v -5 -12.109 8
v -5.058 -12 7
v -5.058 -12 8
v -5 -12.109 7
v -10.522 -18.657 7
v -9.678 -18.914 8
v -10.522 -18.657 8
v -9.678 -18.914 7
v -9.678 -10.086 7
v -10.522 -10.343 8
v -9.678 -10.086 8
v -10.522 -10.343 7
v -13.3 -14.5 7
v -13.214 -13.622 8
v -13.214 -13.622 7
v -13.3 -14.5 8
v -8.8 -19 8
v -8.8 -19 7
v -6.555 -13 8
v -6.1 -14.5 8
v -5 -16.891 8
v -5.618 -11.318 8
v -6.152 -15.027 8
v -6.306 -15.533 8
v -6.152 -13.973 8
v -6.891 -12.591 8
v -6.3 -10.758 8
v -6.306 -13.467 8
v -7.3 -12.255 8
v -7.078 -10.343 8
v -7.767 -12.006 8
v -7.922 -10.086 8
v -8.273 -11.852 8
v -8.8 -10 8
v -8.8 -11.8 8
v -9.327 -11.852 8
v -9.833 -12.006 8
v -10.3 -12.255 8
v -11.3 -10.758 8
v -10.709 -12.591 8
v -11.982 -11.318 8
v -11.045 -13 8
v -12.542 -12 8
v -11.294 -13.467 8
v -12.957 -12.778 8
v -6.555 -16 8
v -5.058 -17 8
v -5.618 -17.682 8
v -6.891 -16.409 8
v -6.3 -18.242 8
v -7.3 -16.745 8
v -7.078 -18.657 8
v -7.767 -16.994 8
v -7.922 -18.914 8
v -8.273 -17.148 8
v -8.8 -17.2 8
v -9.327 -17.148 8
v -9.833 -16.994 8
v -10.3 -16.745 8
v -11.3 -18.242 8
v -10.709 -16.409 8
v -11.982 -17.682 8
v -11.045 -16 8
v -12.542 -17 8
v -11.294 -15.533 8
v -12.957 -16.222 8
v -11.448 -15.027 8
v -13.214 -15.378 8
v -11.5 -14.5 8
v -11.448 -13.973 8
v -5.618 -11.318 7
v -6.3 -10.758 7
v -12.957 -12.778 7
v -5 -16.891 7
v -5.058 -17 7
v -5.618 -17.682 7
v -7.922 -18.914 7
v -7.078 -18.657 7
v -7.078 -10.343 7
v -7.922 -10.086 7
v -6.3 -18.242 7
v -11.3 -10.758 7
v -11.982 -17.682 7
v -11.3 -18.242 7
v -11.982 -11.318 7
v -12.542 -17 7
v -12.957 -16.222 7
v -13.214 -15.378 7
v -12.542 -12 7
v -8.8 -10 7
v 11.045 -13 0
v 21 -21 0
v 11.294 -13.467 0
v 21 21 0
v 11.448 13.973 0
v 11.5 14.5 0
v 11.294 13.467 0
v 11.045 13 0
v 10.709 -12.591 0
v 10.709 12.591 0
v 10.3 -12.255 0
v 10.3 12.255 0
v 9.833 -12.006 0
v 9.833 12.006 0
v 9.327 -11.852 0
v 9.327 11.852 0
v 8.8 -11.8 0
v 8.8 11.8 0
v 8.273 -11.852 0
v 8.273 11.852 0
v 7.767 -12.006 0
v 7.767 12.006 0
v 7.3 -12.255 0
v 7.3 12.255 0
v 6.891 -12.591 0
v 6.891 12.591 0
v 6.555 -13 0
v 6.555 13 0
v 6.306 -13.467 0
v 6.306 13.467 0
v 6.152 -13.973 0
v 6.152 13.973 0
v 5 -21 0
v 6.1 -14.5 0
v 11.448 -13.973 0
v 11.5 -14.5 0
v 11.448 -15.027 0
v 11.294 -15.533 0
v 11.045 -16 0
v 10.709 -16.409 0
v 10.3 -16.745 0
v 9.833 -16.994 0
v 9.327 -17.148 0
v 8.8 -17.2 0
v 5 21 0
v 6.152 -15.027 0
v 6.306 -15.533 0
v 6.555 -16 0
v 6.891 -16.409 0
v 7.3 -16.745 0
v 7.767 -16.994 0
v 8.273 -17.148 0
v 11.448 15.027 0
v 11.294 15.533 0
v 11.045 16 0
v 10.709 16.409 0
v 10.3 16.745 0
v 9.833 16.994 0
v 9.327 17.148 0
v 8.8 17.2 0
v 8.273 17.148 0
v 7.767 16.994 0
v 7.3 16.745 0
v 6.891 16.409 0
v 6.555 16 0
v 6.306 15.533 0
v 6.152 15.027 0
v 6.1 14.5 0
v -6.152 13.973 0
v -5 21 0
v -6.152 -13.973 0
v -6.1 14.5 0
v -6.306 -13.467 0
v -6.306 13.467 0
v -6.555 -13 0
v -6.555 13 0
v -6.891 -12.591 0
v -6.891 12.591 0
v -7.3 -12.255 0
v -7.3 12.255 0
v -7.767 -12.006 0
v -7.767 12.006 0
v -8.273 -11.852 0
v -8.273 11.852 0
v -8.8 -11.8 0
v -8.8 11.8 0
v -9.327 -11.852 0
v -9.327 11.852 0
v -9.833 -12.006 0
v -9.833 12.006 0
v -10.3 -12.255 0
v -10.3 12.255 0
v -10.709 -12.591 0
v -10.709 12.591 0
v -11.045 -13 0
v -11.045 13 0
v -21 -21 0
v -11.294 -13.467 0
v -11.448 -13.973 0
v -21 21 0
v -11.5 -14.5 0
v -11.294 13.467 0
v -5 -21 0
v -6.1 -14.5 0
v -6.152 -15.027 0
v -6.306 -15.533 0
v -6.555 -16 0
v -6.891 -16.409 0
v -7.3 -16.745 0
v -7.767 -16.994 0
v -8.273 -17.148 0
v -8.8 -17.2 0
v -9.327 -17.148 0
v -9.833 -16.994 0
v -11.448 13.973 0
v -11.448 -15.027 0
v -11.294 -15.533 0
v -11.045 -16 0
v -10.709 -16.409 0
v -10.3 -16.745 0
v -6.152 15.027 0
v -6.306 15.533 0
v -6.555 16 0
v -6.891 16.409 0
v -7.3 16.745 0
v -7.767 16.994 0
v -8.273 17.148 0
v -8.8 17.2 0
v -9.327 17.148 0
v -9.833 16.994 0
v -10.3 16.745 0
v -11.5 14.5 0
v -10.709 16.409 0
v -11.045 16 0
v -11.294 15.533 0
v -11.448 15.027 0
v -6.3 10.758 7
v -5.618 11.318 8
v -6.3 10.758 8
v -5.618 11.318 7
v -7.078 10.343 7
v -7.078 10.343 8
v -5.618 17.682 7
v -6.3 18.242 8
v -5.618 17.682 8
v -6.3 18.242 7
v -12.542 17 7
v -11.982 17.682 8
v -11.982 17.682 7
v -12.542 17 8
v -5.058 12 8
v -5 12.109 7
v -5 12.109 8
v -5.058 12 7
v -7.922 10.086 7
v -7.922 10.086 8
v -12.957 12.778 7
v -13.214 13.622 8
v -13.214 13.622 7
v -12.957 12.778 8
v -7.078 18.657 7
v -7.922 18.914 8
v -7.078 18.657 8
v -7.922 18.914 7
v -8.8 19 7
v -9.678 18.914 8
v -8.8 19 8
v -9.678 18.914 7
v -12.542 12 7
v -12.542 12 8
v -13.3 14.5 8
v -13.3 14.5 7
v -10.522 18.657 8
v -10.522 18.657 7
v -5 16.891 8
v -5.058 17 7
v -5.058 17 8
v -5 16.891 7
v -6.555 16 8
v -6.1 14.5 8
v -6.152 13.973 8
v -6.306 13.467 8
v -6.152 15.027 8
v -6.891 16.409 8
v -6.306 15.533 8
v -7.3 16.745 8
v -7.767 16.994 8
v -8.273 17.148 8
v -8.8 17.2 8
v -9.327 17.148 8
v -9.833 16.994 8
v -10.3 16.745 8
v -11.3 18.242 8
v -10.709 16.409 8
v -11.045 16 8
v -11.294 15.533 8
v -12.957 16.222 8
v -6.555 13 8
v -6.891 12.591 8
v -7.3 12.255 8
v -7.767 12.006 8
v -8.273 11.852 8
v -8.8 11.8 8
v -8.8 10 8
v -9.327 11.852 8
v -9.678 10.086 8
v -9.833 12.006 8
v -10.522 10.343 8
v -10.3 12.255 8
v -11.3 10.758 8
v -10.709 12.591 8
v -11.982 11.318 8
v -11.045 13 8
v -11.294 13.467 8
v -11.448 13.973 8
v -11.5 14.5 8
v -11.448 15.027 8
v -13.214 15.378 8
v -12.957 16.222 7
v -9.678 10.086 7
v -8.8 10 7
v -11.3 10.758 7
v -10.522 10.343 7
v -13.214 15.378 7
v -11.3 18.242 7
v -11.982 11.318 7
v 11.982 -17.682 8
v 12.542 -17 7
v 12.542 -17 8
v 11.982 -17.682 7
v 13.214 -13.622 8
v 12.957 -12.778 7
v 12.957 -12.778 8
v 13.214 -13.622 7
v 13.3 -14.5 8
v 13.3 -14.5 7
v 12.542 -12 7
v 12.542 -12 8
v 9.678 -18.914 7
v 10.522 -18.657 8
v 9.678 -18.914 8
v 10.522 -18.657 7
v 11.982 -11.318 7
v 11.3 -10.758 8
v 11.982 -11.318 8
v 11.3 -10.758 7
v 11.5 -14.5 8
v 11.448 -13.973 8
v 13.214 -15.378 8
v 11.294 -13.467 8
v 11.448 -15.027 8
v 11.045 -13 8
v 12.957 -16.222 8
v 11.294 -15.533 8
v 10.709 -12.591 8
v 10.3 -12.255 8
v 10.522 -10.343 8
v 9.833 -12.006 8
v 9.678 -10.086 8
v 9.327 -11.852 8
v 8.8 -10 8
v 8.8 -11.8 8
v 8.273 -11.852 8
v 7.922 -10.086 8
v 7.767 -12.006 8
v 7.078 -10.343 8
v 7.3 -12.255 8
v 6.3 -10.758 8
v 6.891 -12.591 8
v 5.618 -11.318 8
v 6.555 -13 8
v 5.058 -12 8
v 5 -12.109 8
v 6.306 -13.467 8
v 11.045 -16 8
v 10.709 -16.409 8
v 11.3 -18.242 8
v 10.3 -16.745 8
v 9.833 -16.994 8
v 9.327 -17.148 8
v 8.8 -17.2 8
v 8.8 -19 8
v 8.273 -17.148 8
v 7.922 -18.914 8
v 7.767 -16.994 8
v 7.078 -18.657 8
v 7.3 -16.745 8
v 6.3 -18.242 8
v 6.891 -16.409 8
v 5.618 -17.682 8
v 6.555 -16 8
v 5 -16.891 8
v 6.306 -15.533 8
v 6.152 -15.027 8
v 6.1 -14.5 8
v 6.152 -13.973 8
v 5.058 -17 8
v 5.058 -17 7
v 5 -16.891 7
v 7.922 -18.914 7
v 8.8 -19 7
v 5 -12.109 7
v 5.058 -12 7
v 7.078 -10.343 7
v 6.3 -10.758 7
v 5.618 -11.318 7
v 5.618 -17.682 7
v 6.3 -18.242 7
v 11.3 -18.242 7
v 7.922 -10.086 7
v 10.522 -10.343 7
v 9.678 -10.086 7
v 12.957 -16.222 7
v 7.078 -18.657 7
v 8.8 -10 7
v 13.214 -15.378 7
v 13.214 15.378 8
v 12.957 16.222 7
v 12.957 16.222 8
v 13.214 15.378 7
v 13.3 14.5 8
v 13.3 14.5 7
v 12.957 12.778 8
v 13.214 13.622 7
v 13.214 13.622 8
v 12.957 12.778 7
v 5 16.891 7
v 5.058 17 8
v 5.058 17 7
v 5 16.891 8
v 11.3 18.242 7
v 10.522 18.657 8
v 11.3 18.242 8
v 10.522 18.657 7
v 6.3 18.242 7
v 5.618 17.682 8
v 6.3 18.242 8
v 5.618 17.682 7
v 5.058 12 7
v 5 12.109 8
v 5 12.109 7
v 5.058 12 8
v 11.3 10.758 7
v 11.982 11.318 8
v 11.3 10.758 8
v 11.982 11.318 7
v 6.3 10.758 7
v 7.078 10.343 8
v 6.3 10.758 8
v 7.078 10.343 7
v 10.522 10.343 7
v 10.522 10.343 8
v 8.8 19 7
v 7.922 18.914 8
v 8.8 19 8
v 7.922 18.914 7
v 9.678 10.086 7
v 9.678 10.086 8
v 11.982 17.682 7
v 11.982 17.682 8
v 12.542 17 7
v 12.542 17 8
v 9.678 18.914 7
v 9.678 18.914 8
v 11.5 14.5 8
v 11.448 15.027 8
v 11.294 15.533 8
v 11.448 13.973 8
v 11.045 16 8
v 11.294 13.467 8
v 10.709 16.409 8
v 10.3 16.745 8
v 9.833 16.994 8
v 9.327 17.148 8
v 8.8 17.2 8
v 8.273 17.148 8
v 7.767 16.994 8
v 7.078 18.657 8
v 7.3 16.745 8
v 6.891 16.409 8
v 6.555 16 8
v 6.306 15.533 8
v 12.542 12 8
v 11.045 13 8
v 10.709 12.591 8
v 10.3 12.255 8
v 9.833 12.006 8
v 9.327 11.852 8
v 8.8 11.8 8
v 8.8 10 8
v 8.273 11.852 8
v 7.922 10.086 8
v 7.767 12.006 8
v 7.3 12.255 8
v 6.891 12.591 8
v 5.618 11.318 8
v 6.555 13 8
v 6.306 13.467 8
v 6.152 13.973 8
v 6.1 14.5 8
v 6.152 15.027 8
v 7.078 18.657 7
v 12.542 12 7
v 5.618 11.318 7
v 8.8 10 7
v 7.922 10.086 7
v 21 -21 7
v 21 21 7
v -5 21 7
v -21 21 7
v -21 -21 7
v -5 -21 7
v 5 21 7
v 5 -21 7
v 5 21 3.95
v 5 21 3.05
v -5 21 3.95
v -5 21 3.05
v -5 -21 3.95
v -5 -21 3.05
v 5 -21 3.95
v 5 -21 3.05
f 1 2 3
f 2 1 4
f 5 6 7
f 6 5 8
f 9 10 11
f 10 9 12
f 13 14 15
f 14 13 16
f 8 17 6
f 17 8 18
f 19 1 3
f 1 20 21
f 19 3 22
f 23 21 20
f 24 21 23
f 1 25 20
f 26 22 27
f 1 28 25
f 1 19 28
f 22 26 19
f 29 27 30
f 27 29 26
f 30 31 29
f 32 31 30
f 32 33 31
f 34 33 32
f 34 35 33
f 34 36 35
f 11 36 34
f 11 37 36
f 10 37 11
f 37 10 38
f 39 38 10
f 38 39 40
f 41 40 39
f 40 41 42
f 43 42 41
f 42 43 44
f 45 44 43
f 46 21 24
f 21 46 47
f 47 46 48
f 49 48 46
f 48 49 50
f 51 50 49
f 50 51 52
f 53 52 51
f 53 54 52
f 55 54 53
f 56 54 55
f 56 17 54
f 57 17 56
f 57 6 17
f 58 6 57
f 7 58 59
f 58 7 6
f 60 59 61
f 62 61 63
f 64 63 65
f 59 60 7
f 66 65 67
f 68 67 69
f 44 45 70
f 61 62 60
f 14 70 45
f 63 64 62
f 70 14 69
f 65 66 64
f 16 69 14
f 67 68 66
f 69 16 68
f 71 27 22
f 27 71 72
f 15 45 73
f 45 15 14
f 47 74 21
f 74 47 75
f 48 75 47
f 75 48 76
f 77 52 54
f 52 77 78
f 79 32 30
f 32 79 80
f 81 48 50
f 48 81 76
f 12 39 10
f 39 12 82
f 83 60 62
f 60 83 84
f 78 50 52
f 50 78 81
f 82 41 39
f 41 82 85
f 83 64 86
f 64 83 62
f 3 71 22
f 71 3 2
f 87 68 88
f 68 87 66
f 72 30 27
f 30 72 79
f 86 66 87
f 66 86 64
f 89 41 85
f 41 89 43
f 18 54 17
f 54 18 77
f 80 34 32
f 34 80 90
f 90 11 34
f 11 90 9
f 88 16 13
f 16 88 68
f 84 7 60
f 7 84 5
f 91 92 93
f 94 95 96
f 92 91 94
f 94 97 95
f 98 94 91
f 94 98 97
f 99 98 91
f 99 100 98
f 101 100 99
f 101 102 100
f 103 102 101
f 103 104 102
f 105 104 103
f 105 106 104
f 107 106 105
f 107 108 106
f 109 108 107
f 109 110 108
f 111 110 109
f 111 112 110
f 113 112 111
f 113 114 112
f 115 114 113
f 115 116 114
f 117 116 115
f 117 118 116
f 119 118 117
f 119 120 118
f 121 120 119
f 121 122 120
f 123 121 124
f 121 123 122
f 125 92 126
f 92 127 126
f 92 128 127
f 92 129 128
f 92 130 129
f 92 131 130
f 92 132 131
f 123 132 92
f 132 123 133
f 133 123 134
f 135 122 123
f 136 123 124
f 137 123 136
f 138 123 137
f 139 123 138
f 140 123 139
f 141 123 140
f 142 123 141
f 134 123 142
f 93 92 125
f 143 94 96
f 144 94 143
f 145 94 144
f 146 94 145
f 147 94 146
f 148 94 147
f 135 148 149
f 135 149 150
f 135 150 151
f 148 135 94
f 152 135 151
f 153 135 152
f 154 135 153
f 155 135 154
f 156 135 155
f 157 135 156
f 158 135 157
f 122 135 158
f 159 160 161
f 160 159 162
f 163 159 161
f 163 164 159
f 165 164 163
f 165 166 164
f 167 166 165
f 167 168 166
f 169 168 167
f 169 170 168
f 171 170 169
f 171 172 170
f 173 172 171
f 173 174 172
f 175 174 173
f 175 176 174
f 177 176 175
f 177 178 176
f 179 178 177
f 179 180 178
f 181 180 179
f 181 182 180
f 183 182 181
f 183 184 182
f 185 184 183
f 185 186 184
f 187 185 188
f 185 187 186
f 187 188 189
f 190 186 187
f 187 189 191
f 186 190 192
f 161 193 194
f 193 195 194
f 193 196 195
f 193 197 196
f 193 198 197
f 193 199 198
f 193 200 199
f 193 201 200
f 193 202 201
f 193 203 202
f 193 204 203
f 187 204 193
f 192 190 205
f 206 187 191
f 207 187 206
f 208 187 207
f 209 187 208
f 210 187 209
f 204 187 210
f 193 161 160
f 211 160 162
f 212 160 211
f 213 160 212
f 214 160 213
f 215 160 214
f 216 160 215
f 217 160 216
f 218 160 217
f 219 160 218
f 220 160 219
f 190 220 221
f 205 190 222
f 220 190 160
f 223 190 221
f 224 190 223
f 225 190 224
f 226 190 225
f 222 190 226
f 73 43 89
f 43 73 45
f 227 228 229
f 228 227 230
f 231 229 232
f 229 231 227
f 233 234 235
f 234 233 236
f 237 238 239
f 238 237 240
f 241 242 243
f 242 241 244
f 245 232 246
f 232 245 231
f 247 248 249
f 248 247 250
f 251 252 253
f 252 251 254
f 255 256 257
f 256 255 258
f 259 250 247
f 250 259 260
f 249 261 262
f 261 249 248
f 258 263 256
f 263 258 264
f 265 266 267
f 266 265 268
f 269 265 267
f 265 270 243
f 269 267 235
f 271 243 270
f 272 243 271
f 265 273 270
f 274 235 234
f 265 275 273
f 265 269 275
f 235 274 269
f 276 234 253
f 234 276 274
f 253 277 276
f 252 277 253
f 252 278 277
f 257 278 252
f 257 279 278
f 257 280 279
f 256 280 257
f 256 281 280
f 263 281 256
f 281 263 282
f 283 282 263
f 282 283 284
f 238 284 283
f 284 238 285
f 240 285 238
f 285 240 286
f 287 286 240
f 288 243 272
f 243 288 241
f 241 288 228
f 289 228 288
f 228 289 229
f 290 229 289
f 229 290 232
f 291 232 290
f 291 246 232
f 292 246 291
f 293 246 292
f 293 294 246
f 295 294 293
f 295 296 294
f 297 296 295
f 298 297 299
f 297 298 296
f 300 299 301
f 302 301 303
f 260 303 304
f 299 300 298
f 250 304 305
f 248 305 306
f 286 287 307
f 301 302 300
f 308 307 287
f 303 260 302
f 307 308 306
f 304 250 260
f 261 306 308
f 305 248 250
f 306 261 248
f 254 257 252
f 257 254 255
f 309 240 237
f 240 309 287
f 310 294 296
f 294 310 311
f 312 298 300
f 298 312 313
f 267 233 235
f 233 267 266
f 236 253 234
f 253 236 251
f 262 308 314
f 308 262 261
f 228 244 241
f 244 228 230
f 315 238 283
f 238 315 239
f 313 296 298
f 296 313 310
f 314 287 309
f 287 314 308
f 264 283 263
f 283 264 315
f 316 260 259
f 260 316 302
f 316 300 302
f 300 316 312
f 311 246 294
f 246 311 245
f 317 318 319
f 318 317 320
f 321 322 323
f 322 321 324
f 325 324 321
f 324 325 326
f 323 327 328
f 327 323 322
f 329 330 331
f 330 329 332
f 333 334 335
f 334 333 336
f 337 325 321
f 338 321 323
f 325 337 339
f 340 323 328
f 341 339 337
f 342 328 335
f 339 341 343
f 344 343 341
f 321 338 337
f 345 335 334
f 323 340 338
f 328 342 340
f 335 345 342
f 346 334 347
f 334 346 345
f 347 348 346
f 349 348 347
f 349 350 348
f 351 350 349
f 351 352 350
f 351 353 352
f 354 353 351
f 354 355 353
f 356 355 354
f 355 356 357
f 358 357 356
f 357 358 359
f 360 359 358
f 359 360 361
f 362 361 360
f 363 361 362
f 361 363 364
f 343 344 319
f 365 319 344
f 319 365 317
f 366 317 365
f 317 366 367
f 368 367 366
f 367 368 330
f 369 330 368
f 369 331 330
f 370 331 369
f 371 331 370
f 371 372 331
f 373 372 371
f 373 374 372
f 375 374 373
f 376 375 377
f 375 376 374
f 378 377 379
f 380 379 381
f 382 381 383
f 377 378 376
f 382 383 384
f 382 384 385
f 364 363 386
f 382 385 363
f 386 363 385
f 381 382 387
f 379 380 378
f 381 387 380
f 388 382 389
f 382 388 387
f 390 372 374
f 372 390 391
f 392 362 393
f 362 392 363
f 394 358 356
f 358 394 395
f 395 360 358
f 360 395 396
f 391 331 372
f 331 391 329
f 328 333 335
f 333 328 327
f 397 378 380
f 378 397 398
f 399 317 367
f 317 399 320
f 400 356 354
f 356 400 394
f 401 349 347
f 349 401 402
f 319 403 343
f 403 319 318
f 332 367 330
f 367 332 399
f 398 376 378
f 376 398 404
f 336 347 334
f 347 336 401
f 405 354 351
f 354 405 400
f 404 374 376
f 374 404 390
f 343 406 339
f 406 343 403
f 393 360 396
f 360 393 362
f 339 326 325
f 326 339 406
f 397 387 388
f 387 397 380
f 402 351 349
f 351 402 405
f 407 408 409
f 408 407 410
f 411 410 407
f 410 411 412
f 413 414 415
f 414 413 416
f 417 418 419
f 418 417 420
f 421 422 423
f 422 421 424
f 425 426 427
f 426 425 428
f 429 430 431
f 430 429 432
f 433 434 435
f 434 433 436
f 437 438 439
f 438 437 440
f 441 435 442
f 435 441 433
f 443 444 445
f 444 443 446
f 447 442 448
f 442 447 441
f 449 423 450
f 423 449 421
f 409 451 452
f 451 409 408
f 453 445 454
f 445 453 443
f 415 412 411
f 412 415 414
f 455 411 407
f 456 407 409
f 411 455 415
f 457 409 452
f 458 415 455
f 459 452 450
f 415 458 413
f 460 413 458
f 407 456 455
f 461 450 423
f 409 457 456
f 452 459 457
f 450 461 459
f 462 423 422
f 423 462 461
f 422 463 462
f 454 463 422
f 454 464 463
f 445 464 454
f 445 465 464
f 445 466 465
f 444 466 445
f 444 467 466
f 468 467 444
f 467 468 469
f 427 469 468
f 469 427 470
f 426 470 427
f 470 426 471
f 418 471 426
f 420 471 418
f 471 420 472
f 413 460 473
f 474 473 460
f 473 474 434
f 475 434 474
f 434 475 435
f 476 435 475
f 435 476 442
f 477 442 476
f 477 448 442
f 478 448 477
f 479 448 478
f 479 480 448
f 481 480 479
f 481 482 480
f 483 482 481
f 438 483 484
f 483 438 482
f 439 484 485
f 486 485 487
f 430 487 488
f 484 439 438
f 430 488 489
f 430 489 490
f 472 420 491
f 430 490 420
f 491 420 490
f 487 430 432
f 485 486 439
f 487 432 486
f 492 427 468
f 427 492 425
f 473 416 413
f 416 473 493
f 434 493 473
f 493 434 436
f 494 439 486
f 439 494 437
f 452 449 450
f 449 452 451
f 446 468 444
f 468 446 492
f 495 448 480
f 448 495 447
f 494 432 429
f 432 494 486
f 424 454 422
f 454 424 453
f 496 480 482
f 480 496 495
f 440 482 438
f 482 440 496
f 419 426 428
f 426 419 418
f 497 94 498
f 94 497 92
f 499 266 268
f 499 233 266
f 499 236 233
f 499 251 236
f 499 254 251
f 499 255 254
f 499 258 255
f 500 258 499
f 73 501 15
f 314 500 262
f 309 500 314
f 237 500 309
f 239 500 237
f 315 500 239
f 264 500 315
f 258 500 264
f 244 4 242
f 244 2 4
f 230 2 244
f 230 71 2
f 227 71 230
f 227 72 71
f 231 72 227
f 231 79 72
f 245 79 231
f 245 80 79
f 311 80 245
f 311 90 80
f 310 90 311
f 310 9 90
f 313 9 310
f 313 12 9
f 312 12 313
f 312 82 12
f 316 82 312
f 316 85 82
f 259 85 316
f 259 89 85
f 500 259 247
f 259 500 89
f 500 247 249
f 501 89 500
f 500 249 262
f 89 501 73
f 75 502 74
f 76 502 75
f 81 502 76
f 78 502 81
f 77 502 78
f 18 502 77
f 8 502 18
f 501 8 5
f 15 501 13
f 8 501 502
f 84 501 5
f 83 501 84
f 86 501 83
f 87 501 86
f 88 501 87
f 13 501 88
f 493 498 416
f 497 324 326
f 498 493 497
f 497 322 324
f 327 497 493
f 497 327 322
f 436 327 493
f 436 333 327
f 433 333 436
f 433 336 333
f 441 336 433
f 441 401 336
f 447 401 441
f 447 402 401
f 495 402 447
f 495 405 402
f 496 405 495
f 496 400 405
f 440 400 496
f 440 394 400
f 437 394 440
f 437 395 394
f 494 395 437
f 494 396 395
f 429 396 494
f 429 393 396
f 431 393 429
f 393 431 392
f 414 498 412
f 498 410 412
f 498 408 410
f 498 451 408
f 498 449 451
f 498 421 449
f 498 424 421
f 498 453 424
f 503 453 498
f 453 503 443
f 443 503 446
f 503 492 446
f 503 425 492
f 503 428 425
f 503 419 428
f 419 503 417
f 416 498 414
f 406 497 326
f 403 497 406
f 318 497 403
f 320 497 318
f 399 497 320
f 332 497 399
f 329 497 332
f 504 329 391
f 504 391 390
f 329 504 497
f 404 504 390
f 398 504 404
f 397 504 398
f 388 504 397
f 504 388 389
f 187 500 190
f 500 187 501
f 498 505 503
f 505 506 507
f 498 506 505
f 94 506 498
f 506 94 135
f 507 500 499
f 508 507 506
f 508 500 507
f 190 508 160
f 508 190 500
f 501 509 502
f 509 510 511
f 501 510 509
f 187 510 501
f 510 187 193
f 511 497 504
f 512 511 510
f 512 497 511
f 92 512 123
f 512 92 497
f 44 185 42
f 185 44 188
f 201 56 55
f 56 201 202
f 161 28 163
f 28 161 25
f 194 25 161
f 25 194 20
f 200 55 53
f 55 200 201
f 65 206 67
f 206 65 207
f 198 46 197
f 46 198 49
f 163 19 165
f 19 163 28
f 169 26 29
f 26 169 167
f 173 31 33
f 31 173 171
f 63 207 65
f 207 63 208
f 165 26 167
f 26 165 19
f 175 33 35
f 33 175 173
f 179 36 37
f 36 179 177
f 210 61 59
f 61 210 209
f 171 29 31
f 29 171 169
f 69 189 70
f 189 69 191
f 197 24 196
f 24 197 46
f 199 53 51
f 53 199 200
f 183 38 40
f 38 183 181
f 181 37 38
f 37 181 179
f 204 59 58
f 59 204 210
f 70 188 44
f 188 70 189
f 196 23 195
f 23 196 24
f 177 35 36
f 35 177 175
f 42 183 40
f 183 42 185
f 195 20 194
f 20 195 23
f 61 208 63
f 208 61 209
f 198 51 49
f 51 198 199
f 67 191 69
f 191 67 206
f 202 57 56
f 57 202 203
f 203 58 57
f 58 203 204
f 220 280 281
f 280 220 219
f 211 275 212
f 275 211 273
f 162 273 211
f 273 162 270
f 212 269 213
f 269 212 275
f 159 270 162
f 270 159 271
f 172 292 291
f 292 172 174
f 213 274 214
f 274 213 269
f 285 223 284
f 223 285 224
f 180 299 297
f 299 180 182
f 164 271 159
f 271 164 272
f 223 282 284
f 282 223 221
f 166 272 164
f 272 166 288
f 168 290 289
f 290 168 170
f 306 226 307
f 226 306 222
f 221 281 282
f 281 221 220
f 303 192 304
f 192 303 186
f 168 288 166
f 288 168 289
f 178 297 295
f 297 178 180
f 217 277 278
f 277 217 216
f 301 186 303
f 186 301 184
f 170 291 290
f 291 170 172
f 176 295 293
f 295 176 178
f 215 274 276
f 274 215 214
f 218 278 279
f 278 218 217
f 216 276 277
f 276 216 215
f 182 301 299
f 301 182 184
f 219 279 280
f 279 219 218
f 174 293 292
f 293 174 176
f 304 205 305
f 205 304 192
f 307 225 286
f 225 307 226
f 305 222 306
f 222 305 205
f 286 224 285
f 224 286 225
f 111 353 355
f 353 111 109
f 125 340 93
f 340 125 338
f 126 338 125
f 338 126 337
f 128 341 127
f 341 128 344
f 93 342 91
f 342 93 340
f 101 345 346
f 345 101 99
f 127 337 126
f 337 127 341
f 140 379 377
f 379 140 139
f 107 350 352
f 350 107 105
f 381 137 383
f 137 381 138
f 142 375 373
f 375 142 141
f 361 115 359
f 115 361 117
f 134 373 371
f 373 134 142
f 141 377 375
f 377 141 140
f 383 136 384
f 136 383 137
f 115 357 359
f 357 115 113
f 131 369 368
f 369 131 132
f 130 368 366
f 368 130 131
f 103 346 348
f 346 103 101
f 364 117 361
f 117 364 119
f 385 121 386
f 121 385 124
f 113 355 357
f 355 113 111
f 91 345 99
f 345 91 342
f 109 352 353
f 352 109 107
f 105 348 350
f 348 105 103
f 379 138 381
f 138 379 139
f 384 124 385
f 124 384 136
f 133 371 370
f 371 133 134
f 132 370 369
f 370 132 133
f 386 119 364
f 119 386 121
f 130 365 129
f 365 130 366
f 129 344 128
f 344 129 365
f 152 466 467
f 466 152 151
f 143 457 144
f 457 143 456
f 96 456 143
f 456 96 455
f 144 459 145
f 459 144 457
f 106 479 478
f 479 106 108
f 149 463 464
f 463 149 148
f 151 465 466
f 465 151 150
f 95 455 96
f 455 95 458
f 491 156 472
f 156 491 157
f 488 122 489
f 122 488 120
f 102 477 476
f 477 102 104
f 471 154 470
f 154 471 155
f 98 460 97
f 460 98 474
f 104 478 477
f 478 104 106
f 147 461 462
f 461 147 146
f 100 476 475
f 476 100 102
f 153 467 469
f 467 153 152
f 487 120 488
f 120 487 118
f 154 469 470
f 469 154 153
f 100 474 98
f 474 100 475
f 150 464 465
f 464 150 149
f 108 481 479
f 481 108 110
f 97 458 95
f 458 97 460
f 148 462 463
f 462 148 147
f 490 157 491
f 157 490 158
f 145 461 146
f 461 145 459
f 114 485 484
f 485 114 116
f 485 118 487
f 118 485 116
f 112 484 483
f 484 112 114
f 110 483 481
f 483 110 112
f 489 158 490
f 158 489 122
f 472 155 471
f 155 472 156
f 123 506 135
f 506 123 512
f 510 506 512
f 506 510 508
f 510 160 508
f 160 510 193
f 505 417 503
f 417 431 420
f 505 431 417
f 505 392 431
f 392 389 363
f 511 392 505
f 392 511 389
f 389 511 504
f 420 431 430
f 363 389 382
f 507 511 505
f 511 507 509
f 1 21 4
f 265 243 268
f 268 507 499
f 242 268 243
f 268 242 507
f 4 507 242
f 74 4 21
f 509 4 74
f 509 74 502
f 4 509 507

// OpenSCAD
$fn = 32;

// ----------------------------------------------------------------------
// Living hinge: 42 x 42 mm plates, 0.9 mm flexible web
// ----------------------------------------------------------------------

// --- parameters (mm) ---
plate_len = 16;           // plate length outside the web
plate_w = 42;             // plate width
thick = 7;                // plate thickness
web_half = 5;             // half width of the flex band
web_t = 0.9;              // flexible web thickness
web_z = 3.05;             // web position inside the thickness
boss_d = 9;               // screw boss diameter
boss_h = 8;               // screw boss height
boss_x = 8.8;             // screw boss distance from the web
screw_d = 5.4;            // screw hole

difference() {
  union() {
    /* one flat strip, later thinned at the middle */
    translate([-21, -21, 0]) cube([42, 42, 7]);
    /* screw bosses, sunk 0.5 mm into the plates */
    for (sx = [-8.8, 8.8]) {
      for (sy = [-14.5, 14.5]) {
        translate([sx, sy, 0]) cylinder(h = boss_h, d = boss_d);
      }
    }
  }
  /* channel from below: leaves the web on top of it */
  translate([-5, -23.5, -2.5]) cube([10, 47, 5.55]);
  /* channel from above: thins the web down to web_t */
  translate([-5, -23.5, 3.95]) cube([10, 47, 5.55]);
  /* screw holes through the bosses */
  for (sx = [-8.8, 8.8]) {
    for (sy = [-14.5, 14.5]) {
      translate([sx, sy, -2.5]) cylinder(h = boss_h + 5, d = screw_d);
    }
  }
}
